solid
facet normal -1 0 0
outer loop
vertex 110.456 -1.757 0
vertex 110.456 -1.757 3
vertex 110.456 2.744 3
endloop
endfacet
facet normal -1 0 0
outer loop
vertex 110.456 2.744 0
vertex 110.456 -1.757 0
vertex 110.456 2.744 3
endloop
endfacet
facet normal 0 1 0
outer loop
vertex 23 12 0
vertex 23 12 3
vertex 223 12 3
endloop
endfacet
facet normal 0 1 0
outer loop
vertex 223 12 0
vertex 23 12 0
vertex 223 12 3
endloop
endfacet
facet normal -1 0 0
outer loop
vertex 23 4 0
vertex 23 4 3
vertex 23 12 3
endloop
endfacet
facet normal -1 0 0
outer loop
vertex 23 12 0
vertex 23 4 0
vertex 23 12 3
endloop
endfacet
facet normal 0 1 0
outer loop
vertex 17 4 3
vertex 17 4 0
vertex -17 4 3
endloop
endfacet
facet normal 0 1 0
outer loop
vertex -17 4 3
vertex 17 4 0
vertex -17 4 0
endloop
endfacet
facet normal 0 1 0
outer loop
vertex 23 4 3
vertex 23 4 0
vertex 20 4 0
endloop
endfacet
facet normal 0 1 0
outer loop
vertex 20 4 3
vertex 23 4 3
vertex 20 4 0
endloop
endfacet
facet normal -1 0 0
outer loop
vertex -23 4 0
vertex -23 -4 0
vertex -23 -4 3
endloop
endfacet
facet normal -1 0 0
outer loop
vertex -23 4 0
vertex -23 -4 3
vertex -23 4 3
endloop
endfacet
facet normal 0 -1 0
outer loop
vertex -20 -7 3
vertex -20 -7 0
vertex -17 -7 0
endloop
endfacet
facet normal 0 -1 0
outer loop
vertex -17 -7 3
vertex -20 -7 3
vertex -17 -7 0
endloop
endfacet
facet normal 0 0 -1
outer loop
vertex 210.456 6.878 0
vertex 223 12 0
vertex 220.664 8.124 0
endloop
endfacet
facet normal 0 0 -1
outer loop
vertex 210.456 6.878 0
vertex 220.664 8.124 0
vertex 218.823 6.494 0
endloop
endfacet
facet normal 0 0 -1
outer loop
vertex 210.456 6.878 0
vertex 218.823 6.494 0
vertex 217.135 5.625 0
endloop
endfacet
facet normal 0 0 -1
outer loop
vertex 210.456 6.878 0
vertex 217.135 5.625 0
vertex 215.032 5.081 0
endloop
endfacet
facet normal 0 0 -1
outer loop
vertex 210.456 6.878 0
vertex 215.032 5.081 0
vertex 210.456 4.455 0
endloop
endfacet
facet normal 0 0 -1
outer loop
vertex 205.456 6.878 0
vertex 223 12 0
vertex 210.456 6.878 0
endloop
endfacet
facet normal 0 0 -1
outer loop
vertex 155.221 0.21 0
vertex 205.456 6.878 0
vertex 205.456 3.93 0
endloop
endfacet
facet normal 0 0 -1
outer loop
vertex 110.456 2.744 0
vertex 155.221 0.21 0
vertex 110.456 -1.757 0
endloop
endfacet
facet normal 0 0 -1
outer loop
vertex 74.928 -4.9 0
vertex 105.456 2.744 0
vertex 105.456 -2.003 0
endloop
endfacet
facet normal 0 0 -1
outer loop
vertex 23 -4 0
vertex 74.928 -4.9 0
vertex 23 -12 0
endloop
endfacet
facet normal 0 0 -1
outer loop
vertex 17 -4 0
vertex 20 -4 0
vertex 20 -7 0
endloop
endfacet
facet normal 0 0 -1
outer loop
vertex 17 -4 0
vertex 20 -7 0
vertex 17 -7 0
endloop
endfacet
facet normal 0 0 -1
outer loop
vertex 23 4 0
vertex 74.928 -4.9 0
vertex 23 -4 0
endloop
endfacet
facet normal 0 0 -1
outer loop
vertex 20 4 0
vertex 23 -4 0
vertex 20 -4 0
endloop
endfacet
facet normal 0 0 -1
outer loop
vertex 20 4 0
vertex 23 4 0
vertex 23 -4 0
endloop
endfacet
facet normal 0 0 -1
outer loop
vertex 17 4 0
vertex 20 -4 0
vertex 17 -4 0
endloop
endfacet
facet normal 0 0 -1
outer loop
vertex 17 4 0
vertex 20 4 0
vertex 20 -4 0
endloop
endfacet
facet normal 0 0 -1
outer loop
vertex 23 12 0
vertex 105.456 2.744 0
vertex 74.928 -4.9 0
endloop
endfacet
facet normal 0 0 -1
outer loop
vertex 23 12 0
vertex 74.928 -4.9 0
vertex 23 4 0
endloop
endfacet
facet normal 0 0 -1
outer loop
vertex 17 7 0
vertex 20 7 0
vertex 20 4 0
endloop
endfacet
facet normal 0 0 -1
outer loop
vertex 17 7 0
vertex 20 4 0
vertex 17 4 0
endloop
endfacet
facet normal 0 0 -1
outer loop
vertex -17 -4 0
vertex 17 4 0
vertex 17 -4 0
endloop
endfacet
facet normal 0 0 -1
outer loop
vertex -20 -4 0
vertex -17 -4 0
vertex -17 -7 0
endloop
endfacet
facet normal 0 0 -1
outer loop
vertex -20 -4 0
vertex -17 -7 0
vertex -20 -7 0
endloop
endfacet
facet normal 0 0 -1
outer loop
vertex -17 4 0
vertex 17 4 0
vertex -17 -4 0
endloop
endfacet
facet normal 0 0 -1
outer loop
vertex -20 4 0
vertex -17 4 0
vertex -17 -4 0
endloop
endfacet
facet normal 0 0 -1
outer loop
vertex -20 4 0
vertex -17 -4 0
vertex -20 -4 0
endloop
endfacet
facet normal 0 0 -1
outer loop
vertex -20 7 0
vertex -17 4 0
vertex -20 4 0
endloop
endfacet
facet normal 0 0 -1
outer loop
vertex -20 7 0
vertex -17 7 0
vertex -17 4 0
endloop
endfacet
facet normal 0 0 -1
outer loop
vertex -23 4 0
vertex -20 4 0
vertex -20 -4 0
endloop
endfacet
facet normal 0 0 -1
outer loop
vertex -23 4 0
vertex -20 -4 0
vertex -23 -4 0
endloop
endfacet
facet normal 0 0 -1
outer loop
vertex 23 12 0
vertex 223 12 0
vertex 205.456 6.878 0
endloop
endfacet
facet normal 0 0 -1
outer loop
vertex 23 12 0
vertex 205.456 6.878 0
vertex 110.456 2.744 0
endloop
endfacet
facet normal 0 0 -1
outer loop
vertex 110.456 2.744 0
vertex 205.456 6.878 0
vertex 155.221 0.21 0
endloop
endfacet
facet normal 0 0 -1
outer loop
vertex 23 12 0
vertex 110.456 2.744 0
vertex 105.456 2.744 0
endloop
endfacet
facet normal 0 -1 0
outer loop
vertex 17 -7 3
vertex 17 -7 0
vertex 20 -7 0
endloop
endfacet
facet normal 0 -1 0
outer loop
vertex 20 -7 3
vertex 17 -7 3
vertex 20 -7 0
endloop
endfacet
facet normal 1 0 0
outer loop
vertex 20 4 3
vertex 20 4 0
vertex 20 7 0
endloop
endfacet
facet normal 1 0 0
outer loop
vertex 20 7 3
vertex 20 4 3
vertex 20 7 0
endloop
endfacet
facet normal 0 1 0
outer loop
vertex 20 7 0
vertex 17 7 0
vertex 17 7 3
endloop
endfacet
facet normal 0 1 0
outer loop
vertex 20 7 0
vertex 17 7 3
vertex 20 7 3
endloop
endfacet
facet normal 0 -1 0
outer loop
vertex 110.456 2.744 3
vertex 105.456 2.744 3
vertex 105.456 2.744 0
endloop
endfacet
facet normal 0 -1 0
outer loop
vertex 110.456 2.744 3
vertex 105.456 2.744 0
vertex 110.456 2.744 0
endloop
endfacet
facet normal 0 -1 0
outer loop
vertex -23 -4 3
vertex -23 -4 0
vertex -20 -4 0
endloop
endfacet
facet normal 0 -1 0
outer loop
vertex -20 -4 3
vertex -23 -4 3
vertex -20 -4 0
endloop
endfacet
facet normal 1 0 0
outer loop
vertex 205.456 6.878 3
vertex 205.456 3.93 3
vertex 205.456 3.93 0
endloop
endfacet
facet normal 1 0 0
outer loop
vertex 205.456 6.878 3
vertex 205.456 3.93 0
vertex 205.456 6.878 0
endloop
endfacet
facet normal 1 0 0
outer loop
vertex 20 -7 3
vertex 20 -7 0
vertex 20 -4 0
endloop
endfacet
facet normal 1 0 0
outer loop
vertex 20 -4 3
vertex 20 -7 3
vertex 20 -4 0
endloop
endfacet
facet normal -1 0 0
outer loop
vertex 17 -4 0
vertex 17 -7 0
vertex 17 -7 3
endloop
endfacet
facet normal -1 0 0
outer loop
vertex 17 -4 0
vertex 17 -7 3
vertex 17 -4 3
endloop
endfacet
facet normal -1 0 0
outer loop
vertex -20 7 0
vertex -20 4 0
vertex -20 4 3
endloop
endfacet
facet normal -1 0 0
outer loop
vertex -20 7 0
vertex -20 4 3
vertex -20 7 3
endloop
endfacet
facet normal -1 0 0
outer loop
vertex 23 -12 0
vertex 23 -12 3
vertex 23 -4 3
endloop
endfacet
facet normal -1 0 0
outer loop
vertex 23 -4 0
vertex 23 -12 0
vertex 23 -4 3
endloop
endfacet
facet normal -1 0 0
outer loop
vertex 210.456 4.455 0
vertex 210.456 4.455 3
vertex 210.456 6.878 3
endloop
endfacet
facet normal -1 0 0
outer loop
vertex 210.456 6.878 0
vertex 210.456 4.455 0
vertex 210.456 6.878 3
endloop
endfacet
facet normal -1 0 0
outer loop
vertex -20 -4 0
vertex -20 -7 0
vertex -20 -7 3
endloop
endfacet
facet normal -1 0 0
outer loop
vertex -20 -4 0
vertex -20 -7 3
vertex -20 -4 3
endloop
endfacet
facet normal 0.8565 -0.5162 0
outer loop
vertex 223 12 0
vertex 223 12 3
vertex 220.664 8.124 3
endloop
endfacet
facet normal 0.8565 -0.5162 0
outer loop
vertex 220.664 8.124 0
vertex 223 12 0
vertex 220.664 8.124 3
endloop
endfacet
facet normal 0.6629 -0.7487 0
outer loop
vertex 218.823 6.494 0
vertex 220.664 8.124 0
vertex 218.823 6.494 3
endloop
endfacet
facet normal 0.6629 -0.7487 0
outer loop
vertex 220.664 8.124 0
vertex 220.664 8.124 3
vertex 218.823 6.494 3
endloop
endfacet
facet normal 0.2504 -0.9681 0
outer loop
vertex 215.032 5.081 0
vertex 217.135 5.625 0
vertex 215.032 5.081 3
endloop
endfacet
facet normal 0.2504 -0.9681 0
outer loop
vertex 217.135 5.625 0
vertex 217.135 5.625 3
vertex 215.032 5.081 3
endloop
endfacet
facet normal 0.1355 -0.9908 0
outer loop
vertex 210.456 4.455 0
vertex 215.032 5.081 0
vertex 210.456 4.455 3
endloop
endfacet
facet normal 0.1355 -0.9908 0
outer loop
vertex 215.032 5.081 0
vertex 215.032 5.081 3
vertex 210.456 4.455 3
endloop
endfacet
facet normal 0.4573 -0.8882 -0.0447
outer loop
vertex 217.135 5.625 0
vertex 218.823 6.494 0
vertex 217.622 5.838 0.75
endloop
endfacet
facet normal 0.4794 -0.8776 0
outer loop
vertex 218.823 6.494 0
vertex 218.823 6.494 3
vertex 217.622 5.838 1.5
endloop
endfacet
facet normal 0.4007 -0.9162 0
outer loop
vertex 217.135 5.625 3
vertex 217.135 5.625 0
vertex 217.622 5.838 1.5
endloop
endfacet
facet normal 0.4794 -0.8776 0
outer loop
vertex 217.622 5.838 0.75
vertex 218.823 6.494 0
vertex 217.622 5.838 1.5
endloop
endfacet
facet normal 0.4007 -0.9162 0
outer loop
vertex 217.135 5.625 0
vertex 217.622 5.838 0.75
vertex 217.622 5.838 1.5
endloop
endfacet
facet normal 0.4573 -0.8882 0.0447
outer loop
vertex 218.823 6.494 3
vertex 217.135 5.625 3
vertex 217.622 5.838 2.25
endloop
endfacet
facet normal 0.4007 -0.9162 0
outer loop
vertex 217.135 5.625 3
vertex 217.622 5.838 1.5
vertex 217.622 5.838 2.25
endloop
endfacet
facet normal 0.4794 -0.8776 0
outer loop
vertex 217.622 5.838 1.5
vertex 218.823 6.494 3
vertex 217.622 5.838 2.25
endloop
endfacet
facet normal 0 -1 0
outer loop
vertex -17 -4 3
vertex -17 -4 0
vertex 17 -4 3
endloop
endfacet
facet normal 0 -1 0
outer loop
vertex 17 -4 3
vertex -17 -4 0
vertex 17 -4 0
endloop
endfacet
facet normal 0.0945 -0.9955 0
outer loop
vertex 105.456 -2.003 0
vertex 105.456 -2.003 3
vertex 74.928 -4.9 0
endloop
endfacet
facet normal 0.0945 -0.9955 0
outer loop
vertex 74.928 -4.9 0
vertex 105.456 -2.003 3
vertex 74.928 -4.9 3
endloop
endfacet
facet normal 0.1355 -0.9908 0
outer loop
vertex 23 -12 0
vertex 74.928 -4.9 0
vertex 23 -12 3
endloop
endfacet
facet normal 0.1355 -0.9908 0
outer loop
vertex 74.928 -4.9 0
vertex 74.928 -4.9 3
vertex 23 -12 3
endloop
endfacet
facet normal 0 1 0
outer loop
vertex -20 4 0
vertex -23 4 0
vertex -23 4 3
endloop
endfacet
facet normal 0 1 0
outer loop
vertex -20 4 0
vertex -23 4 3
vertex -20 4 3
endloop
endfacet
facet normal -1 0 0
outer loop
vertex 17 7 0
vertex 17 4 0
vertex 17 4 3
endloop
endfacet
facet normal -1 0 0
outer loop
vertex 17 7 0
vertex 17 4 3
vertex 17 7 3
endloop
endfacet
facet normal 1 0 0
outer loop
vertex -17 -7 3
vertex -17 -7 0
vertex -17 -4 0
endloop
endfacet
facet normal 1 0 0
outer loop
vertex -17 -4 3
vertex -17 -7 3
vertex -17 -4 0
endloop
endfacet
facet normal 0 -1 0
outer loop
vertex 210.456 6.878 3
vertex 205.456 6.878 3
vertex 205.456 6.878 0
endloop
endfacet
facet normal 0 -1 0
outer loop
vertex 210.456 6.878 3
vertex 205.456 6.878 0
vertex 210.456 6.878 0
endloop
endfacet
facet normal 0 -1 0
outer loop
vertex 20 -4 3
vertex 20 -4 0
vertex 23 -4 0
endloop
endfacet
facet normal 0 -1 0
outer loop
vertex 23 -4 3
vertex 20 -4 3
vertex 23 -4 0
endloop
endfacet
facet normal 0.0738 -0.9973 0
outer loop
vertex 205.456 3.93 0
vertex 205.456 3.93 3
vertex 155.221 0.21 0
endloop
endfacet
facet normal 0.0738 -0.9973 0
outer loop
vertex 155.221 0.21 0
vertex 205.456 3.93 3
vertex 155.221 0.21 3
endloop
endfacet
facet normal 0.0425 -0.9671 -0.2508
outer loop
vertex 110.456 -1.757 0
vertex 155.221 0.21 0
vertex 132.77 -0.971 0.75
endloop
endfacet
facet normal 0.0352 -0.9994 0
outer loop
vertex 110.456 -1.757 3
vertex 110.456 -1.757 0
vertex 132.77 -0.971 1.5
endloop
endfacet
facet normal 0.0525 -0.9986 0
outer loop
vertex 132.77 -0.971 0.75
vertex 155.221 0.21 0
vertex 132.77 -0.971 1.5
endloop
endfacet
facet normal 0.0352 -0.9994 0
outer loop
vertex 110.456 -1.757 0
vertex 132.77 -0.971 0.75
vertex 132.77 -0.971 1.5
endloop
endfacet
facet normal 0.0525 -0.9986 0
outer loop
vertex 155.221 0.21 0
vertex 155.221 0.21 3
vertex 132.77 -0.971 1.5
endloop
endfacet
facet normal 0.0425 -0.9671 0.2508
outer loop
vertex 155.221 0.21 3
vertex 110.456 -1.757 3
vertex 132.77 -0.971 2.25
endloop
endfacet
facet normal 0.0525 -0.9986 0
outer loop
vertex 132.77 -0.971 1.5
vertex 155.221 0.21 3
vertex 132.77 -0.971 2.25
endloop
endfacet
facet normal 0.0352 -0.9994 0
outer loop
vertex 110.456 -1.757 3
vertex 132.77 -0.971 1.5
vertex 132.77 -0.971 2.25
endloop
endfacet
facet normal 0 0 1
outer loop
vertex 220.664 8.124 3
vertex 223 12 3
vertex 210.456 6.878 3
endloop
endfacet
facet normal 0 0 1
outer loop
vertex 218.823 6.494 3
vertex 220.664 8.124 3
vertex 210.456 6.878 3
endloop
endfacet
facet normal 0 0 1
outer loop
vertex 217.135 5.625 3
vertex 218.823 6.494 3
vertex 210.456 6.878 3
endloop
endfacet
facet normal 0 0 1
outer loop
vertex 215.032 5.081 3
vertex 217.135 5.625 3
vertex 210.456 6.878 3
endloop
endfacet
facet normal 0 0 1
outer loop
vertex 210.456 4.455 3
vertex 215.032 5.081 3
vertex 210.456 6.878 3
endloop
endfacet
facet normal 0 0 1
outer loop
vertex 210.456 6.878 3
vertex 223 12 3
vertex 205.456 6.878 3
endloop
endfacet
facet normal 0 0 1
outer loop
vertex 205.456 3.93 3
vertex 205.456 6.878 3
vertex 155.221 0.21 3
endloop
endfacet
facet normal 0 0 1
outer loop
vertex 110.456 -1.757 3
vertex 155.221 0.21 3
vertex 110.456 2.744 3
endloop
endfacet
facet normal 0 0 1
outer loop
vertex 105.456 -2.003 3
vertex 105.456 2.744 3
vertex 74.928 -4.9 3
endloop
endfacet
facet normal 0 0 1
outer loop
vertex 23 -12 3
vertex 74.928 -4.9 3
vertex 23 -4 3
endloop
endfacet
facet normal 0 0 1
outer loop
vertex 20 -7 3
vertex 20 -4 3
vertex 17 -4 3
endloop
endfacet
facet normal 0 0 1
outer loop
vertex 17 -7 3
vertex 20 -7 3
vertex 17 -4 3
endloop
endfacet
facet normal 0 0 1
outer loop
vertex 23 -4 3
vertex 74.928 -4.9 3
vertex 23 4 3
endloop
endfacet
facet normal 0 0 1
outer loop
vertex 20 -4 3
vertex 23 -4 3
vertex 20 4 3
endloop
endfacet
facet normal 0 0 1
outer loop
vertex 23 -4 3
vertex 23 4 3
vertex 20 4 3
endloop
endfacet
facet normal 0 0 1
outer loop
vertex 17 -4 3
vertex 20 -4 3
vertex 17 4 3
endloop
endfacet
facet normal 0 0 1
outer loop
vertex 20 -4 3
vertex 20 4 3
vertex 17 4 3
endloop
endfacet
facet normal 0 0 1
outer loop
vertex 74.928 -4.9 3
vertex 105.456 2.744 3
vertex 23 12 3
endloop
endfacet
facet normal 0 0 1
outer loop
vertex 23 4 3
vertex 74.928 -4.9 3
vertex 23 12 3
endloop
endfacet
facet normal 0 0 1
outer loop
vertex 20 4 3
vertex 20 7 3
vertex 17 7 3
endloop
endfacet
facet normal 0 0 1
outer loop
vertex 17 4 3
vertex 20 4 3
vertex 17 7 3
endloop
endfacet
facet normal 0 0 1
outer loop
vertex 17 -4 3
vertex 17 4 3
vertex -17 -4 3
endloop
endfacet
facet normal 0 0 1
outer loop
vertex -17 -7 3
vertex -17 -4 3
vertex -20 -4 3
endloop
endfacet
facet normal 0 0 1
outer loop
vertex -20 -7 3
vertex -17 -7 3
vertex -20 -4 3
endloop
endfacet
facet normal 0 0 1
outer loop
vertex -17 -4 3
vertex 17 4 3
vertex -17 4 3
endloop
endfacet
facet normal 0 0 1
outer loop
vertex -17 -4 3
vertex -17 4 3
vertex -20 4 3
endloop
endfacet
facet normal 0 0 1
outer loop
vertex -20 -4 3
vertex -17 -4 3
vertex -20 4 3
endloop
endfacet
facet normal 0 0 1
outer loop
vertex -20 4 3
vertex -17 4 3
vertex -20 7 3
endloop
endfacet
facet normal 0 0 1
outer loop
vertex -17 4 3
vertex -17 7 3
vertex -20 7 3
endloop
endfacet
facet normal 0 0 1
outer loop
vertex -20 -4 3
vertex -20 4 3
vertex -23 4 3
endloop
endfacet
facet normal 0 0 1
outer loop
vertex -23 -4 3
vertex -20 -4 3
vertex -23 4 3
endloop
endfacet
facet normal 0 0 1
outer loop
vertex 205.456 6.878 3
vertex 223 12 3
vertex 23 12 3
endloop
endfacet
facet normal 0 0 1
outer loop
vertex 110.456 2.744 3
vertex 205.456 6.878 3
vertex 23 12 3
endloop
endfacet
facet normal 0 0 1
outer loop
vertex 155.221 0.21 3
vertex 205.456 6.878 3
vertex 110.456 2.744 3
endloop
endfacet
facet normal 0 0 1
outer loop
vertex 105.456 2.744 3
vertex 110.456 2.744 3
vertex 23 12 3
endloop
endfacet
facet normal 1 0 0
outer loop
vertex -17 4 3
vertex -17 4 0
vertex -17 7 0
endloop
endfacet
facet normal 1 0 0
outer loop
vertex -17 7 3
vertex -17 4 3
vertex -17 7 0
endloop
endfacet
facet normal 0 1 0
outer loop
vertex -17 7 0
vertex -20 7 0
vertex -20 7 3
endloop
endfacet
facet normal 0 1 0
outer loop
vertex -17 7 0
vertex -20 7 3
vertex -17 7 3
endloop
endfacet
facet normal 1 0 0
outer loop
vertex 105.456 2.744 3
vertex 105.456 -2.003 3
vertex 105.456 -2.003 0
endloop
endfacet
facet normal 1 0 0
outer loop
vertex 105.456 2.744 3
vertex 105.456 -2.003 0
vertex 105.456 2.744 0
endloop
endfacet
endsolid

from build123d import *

# Parameters (mm, degrees)
SKETCH1_W           = 3
SKETCH1_H           = 3
SKETCH1_H_2         = 8
SKETCH1_W_2         = 34
BOSS_EXTRUDE1_DEPTH = 3
BOSS_EXTRUDE2_DEPTH = 3
SKETCH4_W           = 5
SKETCH4_H           = 11.505026735
SKETCH4_H_2         = 15.63867488
CUT_EXTRUDE1_DEPTH  = 4.0000001


with BuildPart() as part:
    # Sketch1 → Boss-Extrude1 (new body)
    with BuildSketch(Plane.XY):
        with Locations((-18.5, 5.5)):
            Rectangle(SKETCH1_W, SKETCH1_H)
        with Locations((-21.5, 0)):
            Rectangle(SKETCH1_W, SKETCH1_H_2)
        with Locations((-18.5, 0)):
            Rectangle(SKETCH1_W, SKETCH1_H_2)
        with Locations((-18.5, -5.5)):
            Rectangle(SKETCH1_W, SKETCH1_H)
        Rectangle(SKETCH1_W_2, SKETCH1_H_2)
        with Locations((21.5, 0)):
            Rectangle(SKETCH1_W, SKETCH1_H_2)
        with Locations((18.5, 0)):
            Rectangle(SKETCH1_W, SKETCH1_H_2)
        with Locations((18.5, 5.5)):
            Rectangle(SKETCH1_W, SKETCH1_H)
        with Locations((18.5, -5.5)):
            Rectangle(SKETCH1_W, SKETCH1_H)
    extrude(amount=BOSS_EXTRUDE1_DEPTH)

    # Sketch2 → Boss-Extrude2 (add)
    with BuildSketch(Plane.XY.offset(3)):
        with BuildLine():
            Line((23, -12), (23, 12))
            Line((23, 12), (223, 12))
            add(Edge.make_bspline(
                [(223, 12), (221.140597213, 7.892255131), (218.702083634, 6.19593369), (212.790204305, 3.931408425), (103.066716712, -3.738921761), (102.009324238, -0.499389529), (23, -12)],
                knots=[0, 0, 0, 0, 0.169852777, 0.23255249, 0.583169949, 1, 1, 1, 1], degree=3))
        make_face()
    extrude(amount=-BOSS_EXTRUDE2_DEPTH)

    # Sketch4 → Cut-Extrude1 (cut, through all)
    with BuildSketch(Plane.XY.offset(3)):
        with Locations((107.956458128, -3.008631932)):
            Rectangle(SKETCH4_W, SKETCH4_H)
        with Locations((207.956458128, -0.941807859)):
            Rectangle(SKETCH4_W, SKETCH4_H_2)
    extrude(amount=-CUT_EXTRUDE1_DEPTH, mode=Mode.SUBTRACT)


solid = part.part
